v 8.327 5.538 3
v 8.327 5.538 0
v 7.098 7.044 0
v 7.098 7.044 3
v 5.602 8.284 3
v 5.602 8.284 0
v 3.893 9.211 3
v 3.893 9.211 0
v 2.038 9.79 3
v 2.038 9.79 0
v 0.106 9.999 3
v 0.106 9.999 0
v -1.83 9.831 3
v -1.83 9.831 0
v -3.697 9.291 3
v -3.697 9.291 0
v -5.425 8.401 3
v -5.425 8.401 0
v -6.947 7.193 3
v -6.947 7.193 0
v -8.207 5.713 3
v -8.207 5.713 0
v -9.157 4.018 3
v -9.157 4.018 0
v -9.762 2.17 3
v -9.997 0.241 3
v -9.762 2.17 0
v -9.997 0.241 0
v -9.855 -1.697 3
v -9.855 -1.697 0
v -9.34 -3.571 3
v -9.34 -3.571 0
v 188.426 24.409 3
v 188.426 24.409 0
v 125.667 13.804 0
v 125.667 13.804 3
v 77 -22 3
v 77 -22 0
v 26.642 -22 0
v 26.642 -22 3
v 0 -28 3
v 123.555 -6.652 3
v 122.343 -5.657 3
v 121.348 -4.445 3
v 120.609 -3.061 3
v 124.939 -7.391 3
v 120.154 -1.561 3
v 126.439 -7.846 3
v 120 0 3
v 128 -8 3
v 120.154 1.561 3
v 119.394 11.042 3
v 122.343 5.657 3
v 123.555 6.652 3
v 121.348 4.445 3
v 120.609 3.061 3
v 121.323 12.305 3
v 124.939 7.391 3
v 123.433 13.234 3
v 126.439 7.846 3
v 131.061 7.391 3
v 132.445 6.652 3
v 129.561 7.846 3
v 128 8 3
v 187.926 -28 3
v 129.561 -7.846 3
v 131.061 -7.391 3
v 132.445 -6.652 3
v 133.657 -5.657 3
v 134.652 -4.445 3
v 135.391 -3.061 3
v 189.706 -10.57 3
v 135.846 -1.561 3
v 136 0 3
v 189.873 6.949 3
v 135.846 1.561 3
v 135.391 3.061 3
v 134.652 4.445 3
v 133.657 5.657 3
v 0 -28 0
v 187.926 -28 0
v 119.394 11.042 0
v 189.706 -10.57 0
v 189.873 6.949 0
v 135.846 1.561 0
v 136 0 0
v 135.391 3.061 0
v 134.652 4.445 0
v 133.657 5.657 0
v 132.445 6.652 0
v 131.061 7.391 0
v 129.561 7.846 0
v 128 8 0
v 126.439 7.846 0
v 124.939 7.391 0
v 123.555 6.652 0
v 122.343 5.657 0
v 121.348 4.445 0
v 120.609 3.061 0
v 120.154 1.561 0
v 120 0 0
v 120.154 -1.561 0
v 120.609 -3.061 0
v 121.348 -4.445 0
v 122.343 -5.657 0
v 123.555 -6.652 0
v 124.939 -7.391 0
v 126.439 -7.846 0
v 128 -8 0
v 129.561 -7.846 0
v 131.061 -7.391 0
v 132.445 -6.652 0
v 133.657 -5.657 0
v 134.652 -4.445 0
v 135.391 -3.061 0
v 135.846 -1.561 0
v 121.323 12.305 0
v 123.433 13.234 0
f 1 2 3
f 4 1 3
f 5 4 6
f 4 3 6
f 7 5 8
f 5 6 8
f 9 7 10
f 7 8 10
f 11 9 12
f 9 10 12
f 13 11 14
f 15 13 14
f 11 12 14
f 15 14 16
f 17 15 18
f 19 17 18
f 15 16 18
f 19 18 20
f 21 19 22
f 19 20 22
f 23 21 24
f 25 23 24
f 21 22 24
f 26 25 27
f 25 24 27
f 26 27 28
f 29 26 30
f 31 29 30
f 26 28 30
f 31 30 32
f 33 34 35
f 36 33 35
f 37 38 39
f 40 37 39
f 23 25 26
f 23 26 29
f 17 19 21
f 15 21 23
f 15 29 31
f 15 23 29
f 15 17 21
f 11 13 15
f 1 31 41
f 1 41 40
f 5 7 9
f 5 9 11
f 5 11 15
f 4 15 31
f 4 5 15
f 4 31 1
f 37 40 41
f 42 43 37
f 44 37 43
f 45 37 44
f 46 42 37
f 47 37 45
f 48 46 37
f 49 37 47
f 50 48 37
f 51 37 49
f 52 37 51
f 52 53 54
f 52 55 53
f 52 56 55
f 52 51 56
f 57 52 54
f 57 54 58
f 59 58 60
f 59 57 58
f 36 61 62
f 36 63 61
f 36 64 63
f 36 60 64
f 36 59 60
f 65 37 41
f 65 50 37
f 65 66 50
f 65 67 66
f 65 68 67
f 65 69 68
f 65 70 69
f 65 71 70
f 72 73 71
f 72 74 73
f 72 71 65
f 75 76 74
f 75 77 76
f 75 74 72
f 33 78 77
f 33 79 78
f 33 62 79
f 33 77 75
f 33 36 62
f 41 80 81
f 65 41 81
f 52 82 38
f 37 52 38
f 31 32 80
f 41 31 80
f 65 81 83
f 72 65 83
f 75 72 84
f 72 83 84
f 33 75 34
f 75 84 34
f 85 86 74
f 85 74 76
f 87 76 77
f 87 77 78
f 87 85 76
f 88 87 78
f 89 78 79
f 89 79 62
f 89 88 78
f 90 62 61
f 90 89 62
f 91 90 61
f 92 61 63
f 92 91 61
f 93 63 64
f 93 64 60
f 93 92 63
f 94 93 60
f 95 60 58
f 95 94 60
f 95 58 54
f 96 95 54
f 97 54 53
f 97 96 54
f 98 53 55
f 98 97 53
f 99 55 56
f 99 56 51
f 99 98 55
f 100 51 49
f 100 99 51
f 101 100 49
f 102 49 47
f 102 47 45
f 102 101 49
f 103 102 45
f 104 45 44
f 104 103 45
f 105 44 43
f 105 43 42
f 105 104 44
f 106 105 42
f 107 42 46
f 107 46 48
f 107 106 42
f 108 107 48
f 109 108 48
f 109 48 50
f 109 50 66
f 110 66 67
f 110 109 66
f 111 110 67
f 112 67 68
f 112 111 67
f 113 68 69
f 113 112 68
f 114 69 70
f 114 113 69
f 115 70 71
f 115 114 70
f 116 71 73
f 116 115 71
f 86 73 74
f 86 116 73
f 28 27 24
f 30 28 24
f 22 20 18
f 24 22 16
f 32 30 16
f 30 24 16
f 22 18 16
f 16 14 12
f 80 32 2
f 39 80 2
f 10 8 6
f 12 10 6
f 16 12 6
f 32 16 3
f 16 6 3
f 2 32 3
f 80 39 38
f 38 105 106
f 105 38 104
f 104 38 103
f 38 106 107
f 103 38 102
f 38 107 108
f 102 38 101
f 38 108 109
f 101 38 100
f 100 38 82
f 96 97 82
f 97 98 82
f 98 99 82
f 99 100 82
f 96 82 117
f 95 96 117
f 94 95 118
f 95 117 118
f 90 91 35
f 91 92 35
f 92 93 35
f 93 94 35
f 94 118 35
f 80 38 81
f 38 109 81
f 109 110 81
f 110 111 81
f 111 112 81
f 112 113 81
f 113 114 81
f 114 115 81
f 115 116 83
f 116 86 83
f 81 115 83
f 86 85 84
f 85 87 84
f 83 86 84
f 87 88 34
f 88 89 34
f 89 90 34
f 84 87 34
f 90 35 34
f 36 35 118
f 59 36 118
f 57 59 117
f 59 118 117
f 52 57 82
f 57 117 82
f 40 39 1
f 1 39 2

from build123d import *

# Parameters (mm, degrees)
SKETCH_1_R      = 8
EXTRUDE_1_DEPTH = 3


with BuildPart() as part:
    # Эскиз1 → Бобышка-Вытянуть1 (new body)
    with BuildSketch(Plane.XY):
        with BuildLine():
            Line((-9.340497736, -3.571428571), (0, -28))
            Line((0, -28), (187.92551716, -28))
            ThreePointArc((187.92551716, -28), (189.991352408, -1.812735596), (188.425560886, 24.409178696))
            Line((188.425560886, 24.409178696), (125.667350293, 13.804301697))
            ThreePointArc((125.667350293, 13.804301697), (122.358795725, 12.813150055), (119.393575063, 11.042166898))
            Line((119.393575063, 11.042166898), (77, -22))
            Line((77, -22), (26.641557218, -22))
            Line((26.641557218, -22), (8.326583423, 5.537870395))
            ThreePointArc((8.326583423, 5.537870395), (-4.582776175, 8.888091051), (-9.340497736, -3.571428571))
        make_face()
        with Locations((128, 0)):
            Circle(SKETCH_1_R, mode=Mode.SUBTRACT)
    extrude(amount=EXTRUDE_1_DEPTH)


solid = part.part
